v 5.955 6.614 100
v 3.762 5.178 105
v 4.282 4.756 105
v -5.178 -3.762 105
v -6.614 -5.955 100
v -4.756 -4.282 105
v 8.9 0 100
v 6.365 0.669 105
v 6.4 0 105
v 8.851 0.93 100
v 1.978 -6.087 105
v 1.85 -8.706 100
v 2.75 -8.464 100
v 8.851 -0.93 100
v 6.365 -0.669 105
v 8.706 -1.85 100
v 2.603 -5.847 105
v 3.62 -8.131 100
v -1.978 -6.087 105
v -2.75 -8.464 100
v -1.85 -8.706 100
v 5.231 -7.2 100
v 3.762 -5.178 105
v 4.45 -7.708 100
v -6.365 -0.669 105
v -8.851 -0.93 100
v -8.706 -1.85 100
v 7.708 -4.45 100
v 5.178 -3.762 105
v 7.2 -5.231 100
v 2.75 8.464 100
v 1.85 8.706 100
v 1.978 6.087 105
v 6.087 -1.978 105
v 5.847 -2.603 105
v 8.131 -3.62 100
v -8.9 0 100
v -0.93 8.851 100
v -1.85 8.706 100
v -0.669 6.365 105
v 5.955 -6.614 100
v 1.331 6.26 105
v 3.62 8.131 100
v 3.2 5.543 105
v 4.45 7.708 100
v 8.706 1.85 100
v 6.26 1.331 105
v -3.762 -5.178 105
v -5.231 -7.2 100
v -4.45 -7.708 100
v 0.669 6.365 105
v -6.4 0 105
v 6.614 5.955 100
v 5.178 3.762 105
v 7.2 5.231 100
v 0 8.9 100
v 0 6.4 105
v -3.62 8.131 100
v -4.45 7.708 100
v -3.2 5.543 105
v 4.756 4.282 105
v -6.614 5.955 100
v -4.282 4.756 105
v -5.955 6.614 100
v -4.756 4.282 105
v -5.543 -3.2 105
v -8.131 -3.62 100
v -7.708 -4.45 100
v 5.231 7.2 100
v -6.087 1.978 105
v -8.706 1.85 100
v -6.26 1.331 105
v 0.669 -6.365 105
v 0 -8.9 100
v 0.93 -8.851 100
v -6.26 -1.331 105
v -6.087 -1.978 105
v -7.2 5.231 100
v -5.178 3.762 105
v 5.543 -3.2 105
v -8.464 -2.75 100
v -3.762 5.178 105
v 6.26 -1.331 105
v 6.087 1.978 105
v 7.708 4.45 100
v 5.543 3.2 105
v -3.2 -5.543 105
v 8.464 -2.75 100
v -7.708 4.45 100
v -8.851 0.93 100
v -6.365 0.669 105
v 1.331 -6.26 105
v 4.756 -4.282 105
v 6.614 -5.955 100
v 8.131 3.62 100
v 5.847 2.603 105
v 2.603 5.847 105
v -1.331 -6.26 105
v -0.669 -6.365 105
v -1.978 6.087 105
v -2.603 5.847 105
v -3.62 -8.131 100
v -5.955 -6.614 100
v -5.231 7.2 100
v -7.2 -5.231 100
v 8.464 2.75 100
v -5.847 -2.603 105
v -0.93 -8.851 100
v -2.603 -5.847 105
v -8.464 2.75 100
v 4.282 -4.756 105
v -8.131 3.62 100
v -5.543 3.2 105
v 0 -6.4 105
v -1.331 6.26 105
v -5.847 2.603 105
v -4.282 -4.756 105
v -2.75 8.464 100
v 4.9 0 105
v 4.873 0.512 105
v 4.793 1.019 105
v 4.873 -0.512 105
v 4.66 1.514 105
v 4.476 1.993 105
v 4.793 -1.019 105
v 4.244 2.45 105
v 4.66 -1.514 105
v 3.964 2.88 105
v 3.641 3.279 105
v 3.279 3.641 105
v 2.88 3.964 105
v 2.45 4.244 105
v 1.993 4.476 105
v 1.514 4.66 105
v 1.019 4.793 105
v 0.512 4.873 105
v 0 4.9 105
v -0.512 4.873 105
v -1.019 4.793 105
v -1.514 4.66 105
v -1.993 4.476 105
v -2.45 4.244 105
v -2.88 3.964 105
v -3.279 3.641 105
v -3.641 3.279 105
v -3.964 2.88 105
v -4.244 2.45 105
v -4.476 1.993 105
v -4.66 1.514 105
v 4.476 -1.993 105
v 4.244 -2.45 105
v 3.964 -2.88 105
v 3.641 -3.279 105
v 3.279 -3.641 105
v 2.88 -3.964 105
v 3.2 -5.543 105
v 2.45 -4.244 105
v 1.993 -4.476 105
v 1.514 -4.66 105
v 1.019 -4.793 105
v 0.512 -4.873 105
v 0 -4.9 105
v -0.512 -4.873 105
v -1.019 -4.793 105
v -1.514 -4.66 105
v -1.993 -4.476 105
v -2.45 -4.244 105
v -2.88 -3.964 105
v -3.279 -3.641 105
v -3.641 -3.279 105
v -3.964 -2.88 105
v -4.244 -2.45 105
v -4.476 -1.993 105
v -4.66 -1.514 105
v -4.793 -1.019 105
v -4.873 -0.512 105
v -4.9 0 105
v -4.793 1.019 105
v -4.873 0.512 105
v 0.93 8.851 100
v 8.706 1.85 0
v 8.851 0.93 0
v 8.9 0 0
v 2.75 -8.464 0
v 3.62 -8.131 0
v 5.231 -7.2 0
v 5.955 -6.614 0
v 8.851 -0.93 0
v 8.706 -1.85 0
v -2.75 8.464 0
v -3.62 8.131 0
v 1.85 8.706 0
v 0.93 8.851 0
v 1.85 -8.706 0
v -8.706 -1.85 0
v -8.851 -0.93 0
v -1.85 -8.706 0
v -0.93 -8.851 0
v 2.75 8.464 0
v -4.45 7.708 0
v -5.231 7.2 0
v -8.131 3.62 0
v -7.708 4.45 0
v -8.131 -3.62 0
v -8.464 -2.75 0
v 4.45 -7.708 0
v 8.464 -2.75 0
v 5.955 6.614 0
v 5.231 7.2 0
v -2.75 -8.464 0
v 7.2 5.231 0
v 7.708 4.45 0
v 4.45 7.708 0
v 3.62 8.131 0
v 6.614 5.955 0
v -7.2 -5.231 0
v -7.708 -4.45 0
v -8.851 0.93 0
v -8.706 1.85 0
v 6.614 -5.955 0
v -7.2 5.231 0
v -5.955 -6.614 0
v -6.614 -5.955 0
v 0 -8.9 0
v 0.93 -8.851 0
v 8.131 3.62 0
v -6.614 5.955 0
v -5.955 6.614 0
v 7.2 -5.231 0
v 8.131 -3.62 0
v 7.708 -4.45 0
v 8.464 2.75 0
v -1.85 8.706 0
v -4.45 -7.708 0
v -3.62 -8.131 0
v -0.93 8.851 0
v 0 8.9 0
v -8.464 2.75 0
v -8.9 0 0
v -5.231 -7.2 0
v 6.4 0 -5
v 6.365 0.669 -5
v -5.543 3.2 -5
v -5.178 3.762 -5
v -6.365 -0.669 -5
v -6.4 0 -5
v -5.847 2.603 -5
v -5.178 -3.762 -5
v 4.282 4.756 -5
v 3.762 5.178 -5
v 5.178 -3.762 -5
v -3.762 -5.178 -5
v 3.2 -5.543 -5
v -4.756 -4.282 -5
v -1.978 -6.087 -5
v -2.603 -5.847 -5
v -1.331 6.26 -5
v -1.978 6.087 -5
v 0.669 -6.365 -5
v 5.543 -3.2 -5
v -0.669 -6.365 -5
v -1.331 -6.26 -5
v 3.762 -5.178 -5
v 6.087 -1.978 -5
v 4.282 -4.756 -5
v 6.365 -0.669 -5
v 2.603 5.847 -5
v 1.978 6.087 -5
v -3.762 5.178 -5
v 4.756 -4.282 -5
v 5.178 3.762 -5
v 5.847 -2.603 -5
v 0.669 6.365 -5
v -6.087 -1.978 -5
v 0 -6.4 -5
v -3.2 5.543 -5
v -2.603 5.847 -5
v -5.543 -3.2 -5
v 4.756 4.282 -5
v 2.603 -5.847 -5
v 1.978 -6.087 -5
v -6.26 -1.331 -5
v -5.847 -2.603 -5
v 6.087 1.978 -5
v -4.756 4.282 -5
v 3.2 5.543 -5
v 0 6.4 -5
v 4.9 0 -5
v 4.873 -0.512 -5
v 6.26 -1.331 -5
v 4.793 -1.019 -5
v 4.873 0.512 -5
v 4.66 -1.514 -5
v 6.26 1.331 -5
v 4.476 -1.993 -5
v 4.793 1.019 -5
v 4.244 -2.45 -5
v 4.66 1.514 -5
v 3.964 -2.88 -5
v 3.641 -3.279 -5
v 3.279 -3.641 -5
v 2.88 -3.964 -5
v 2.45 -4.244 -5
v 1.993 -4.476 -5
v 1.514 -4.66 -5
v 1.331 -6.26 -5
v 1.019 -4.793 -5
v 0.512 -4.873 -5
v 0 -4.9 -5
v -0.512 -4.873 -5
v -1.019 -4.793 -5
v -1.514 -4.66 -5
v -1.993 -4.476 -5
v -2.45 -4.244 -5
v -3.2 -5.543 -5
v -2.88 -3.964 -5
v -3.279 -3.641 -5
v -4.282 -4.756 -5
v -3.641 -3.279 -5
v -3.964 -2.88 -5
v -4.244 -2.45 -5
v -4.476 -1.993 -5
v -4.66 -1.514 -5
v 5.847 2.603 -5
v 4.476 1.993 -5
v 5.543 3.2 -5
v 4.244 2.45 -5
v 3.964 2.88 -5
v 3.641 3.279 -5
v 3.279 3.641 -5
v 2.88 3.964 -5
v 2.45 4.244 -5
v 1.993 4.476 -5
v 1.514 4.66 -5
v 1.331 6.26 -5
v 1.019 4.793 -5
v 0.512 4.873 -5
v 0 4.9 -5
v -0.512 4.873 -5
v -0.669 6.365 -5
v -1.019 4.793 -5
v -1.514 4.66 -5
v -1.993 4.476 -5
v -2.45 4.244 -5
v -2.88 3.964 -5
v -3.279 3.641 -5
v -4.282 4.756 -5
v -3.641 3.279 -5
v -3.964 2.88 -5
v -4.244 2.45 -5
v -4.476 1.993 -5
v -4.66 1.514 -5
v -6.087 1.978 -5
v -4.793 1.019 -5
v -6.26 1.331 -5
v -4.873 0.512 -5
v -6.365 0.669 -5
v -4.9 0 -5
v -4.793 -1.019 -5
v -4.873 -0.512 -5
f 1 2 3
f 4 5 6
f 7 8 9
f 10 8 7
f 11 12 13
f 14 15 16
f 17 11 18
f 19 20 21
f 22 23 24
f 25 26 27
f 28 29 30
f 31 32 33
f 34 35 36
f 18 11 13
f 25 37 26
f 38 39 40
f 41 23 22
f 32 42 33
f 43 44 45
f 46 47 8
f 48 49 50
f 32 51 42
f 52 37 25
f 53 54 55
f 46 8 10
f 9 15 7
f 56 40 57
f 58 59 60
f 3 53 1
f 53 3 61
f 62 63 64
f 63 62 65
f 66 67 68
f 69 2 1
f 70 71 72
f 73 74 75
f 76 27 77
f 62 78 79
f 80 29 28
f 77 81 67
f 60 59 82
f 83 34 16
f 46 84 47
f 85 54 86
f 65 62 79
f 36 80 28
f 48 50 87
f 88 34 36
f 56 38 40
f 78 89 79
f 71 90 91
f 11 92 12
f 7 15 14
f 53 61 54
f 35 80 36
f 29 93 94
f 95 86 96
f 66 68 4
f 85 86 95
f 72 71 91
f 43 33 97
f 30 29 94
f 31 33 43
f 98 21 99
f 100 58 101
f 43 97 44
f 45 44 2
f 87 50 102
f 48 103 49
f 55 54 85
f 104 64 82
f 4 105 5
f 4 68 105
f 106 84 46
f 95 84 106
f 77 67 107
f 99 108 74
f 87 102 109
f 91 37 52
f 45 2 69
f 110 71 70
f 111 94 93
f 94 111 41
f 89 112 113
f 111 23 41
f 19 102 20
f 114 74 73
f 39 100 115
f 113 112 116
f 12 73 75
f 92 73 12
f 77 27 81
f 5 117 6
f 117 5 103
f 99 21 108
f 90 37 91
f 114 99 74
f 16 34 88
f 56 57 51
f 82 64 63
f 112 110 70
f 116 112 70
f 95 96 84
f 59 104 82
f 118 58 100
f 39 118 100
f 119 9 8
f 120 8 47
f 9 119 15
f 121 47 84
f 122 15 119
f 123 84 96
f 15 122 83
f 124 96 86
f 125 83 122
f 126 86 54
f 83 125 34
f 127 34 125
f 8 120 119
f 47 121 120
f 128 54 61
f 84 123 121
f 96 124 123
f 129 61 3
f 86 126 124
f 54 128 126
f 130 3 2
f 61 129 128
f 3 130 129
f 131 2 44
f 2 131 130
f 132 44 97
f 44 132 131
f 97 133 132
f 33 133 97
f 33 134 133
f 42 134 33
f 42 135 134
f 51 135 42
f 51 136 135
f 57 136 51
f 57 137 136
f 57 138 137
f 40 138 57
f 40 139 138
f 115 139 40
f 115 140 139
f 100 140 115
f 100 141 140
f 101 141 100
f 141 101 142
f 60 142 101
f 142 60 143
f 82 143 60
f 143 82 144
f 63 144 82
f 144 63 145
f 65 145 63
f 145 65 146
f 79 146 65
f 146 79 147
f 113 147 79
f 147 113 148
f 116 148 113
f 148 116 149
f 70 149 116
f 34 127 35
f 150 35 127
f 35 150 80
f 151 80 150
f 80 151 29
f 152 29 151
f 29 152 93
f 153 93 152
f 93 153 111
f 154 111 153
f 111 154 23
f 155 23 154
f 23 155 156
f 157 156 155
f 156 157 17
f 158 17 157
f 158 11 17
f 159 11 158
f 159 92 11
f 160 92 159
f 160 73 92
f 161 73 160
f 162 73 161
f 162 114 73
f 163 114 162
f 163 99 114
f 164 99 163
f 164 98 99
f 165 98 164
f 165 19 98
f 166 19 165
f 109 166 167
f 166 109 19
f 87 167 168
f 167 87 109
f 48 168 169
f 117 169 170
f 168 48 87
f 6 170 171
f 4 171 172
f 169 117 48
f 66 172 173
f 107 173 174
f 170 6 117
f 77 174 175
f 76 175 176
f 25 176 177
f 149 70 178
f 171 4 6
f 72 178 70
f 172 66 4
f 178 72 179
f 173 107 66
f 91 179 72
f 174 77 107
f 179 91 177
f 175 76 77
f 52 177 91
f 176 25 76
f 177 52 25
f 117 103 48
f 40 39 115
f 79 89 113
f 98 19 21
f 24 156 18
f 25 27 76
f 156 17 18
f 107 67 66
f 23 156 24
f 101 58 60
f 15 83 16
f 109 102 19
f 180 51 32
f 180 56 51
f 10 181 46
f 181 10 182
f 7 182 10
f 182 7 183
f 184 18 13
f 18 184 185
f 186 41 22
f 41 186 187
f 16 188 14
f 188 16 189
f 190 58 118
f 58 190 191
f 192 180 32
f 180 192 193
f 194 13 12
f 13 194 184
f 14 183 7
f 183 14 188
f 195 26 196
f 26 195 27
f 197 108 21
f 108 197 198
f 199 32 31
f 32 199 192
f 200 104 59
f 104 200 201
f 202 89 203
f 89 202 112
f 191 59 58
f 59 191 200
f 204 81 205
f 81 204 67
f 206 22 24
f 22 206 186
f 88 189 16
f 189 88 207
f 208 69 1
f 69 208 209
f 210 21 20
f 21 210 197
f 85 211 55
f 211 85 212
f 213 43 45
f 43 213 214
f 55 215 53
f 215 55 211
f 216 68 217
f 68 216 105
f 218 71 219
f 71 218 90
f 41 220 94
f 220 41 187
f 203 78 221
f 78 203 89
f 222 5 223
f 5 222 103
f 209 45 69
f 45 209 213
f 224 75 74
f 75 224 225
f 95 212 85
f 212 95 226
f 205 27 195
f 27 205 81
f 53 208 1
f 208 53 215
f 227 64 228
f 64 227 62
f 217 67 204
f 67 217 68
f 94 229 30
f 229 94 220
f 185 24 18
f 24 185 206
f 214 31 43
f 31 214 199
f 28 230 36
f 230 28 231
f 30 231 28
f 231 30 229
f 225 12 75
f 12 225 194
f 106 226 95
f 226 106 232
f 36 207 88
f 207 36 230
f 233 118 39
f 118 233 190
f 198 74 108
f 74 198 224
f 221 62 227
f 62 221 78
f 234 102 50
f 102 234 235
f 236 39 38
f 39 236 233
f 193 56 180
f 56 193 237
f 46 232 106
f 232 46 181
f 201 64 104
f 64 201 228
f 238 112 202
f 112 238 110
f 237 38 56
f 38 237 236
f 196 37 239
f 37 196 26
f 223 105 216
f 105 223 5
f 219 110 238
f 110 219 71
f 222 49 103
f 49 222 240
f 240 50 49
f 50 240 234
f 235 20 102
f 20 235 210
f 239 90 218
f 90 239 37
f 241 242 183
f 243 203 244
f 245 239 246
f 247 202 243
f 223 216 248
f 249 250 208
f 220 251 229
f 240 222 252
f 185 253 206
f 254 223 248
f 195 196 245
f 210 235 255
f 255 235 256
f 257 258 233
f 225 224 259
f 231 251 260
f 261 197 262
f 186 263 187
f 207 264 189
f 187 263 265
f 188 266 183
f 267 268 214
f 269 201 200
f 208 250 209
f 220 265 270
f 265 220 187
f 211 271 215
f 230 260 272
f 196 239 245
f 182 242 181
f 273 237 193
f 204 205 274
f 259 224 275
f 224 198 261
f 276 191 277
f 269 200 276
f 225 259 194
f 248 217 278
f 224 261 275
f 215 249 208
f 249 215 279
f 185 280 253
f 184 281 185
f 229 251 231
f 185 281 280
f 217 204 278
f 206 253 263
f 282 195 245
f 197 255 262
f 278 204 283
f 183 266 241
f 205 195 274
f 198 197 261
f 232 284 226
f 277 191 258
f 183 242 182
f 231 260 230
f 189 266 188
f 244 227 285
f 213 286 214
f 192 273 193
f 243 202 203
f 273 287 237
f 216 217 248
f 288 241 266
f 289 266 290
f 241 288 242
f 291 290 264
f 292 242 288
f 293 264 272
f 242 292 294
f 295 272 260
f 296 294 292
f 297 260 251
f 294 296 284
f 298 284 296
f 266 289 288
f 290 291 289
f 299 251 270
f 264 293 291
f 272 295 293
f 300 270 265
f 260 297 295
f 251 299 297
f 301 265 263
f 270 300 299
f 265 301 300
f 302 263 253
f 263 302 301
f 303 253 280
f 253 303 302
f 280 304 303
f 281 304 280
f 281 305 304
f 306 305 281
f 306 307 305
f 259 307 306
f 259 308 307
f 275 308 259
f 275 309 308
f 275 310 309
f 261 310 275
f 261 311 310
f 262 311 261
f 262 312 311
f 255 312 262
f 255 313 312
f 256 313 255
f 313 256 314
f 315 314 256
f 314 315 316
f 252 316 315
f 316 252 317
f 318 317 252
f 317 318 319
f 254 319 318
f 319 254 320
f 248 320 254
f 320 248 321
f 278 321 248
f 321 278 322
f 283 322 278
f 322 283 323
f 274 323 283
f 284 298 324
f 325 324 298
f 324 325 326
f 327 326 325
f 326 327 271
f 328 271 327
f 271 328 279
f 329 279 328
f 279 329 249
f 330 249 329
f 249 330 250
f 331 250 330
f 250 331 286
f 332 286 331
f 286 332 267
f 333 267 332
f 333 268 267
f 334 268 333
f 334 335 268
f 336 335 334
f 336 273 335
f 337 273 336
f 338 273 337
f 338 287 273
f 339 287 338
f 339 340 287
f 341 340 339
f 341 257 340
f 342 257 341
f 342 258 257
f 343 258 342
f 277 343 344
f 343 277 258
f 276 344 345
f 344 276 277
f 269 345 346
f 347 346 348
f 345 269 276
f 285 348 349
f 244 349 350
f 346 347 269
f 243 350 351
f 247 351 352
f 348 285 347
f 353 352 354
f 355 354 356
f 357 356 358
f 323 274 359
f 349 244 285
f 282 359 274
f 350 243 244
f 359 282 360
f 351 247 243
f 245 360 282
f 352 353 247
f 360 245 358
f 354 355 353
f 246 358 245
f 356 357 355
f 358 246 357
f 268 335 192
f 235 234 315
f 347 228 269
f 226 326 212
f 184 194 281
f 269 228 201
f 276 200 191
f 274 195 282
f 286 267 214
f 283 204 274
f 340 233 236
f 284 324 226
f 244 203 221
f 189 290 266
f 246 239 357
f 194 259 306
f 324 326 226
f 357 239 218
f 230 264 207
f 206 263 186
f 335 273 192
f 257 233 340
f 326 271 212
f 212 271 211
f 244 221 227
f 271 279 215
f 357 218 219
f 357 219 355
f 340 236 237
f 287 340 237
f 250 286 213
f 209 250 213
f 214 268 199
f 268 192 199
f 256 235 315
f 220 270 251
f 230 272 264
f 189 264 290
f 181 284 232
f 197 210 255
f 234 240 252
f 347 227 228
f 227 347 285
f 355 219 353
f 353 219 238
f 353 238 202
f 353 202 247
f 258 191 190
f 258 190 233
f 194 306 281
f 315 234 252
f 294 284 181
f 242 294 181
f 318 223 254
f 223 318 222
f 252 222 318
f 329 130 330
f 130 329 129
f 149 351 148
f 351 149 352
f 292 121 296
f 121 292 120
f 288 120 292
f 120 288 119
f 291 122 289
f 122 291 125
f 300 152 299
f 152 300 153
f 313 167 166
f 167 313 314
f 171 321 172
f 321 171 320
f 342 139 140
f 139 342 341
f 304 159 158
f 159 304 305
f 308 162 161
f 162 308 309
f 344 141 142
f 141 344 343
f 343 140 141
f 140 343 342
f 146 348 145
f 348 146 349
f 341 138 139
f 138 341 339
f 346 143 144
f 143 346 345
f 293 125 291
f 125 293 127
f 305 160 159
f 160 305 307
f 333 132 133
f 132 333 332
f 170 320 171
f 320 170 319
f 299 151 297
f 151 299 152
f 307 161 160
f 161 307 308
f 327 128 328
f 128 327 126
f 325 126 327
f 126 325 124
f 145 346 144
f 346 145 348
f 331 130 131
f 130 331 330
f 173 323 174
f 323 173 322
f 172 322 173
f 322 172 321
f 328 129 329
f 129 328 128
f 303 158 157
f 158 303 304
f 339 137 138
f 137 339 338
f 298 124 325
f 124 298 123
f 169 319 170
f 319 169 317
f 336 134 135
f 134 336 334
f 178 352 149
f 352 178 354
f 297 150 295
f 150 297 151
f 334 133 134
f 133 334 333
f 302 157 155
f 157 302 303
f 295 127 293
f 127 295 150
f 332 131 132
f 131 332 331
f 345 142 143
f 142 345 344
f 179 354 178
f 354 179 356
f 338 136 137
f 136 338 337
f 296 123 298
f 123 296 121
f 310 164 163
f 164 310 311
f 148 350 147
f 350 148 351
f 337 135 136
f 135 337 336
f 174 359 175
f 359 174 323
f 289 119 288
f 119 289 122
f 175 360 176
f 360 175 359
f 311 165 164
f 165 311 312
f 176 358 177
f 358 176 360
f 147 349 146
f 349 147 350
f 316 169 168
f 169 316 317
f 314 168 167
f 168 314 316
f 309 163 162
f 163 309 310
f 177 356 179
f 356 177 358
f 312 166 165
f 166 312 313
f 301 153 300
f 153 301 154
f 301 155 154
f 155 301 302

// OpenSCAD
//Watschelfrosch
$fn = 60;
cyl_lenght = 100;
wood_diameter = 9.8; //incl. toleranze, wood has 9.4
cyl_thickness = 4;

difference()
{
    union()
    {
        translate([0,0,cyl_lenght])
            cylinder(d1=wood_diameter+2*cyl_thickness, d2=wood_diameter+3, h=5);
        cylinder(d=wood_diameter+2*cyl_thickness, h=cyl_lenght);
        translate([0,0,-5])
        cylinder(d2=wood_diameter+2*cyl_thickness, d1=wood_diameter+3, h=5);
    }
    translate([0,0,-20])
        cylinder(d=wood_diameter, h=cyl_lenght*2);
}
